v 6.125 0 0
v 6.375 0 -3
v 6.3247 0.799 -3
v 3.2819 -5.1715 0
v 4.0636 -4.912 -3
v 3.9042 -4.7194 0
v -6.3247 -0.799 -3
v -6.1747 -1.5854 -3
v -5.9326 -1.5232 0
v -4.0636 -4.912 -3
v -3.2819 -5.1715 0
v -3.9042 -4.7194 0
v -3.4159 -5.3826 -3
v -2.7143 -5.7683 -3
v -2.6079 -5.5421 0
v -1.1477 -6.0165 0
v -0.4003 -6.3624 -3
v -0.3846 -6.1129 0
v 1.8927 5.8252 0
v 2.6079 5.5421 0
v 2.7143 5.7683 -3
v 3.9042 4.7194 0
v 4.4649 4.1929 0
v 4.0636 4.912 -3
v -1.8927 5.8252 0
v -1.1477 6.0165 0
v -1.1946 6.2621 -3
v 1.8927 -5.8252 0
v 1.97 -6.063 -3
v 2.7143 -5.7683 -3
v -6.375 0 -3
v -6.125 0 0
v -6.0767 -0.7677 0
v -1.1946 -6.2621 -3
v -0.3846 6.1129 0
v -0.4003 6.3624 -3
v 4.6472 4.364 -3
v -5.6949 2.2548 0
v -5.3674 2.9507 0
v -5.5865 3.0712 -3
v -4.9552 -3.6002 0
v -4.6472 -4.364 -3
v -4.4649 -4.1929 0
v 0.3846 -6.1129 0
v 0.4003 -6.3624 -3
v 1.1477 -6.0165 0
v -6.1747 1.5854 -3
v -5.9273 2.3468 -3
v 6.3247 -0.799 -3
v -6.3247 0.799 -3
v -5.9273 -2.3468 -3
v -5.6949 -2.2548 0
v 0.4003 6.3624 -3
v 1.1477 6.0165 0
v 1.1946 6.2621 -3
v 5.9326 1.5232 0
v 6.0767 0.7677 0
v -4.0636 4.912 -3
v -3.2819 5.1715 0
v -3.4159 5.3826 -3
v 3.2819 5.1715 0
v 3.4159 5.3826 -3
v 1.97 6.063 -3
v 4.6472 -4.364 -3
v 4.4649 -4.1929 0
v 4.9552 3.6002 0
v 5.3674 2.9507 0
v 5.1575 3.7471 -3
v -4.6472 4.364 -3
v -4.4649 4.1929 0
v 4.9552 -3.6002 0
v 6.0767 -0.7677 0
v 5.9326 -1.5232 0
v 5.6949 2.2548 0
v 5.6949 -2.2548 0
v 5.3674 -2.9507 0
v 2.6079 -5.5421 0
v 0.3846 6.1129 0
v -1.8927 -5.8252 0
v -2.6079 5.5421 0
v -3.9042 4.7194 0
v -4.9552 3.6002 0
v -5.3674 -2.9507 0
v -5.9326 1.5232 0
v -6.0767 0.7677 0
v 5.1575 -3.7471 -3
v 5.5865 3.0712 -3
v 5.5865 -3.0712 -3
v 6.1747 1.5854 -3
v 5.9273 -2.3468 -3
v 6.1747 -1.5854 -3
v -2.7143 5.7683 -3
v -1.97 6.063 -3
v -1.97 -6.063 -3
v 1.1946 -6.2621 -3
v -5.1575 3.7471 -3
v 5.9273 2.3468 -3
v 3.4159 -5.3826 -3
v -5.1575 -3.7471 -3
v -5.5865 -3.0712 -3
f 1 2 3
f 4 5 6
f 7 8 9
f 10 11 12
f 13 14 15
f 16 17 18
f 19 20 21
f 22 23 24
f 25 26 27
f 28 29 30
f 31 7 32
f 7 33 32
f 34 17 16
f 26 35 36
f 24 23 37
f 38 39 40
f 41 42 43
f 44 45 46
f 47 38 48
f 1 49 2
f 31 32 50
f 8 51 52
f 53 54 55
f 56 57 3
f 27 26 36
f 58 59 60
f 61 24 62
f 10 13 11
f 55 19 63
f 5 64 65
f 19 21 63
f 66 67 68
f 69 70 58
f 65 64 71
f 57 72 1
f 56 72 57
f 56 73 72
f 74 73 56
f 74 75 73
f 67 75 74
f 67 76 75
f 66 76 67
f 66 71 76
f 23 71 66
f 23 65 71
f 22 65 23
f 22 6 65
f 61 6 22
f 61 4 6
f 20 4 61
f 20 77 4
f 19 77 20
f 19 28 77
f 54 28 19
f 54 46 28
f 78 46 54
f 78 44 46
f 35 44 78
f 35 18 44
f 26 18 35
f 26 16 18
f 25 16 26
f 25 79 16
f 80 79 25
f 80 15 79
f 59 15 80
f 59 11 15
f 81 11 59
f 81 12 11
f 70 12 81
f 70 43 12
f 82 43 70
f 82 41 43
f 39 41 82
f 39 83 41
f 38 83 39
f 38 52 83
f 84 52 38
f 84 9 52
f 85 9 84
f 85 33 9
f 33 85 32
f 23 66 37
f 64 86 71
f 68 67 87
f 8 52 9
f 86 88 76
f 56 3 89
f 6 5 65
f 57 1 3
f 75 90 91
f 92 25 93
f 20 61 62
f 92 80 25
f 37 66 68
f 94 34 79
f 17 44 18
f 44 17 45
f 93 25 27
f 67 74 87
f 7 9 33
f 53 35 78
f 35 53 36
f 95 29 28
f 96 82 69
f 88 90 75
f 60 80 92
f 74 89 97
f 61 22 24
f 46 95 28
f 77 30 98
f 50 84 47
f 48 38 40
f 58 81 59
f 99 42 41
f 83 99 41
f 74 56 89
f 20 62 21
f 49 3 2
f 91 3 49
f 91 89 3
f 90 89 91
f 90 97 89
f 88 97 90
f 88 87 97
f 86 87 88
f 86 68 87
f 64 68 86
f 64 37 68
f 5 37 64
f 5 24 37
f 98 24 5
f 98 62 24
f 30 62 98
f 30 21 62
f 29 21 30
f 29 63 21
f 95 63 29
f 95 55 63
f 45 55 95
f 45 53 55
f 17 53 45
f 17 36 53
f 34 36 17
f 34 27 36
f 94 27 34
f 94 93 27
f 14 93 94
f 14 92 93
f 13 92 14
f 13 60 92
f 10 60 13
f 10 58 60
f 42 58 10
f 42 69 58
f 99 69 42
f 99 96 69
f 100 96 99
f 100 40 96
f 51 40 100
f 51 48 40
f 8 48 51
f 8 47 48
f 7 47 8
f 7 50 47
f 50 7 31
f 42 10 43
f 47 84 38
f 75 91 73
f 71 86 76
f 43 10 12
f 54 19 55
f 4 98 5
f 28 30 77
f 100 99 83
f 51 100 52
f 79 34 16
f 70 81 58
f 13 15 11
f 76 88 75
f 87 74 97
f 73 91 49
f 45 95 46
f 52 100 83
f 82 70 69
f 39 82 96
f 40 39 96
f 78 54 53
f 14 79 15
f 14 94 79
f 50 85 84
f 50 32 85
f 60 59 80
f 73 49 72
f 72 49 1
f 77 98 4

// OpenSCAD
$fn = 50;


difference() {
	union() {
		translate(v = [0, 0, -3.0000000000]) {
			cylinder(h = 3, r1 = 6.3750000000, r2 = 6.1250000000);
		}
	}
	union();
}
